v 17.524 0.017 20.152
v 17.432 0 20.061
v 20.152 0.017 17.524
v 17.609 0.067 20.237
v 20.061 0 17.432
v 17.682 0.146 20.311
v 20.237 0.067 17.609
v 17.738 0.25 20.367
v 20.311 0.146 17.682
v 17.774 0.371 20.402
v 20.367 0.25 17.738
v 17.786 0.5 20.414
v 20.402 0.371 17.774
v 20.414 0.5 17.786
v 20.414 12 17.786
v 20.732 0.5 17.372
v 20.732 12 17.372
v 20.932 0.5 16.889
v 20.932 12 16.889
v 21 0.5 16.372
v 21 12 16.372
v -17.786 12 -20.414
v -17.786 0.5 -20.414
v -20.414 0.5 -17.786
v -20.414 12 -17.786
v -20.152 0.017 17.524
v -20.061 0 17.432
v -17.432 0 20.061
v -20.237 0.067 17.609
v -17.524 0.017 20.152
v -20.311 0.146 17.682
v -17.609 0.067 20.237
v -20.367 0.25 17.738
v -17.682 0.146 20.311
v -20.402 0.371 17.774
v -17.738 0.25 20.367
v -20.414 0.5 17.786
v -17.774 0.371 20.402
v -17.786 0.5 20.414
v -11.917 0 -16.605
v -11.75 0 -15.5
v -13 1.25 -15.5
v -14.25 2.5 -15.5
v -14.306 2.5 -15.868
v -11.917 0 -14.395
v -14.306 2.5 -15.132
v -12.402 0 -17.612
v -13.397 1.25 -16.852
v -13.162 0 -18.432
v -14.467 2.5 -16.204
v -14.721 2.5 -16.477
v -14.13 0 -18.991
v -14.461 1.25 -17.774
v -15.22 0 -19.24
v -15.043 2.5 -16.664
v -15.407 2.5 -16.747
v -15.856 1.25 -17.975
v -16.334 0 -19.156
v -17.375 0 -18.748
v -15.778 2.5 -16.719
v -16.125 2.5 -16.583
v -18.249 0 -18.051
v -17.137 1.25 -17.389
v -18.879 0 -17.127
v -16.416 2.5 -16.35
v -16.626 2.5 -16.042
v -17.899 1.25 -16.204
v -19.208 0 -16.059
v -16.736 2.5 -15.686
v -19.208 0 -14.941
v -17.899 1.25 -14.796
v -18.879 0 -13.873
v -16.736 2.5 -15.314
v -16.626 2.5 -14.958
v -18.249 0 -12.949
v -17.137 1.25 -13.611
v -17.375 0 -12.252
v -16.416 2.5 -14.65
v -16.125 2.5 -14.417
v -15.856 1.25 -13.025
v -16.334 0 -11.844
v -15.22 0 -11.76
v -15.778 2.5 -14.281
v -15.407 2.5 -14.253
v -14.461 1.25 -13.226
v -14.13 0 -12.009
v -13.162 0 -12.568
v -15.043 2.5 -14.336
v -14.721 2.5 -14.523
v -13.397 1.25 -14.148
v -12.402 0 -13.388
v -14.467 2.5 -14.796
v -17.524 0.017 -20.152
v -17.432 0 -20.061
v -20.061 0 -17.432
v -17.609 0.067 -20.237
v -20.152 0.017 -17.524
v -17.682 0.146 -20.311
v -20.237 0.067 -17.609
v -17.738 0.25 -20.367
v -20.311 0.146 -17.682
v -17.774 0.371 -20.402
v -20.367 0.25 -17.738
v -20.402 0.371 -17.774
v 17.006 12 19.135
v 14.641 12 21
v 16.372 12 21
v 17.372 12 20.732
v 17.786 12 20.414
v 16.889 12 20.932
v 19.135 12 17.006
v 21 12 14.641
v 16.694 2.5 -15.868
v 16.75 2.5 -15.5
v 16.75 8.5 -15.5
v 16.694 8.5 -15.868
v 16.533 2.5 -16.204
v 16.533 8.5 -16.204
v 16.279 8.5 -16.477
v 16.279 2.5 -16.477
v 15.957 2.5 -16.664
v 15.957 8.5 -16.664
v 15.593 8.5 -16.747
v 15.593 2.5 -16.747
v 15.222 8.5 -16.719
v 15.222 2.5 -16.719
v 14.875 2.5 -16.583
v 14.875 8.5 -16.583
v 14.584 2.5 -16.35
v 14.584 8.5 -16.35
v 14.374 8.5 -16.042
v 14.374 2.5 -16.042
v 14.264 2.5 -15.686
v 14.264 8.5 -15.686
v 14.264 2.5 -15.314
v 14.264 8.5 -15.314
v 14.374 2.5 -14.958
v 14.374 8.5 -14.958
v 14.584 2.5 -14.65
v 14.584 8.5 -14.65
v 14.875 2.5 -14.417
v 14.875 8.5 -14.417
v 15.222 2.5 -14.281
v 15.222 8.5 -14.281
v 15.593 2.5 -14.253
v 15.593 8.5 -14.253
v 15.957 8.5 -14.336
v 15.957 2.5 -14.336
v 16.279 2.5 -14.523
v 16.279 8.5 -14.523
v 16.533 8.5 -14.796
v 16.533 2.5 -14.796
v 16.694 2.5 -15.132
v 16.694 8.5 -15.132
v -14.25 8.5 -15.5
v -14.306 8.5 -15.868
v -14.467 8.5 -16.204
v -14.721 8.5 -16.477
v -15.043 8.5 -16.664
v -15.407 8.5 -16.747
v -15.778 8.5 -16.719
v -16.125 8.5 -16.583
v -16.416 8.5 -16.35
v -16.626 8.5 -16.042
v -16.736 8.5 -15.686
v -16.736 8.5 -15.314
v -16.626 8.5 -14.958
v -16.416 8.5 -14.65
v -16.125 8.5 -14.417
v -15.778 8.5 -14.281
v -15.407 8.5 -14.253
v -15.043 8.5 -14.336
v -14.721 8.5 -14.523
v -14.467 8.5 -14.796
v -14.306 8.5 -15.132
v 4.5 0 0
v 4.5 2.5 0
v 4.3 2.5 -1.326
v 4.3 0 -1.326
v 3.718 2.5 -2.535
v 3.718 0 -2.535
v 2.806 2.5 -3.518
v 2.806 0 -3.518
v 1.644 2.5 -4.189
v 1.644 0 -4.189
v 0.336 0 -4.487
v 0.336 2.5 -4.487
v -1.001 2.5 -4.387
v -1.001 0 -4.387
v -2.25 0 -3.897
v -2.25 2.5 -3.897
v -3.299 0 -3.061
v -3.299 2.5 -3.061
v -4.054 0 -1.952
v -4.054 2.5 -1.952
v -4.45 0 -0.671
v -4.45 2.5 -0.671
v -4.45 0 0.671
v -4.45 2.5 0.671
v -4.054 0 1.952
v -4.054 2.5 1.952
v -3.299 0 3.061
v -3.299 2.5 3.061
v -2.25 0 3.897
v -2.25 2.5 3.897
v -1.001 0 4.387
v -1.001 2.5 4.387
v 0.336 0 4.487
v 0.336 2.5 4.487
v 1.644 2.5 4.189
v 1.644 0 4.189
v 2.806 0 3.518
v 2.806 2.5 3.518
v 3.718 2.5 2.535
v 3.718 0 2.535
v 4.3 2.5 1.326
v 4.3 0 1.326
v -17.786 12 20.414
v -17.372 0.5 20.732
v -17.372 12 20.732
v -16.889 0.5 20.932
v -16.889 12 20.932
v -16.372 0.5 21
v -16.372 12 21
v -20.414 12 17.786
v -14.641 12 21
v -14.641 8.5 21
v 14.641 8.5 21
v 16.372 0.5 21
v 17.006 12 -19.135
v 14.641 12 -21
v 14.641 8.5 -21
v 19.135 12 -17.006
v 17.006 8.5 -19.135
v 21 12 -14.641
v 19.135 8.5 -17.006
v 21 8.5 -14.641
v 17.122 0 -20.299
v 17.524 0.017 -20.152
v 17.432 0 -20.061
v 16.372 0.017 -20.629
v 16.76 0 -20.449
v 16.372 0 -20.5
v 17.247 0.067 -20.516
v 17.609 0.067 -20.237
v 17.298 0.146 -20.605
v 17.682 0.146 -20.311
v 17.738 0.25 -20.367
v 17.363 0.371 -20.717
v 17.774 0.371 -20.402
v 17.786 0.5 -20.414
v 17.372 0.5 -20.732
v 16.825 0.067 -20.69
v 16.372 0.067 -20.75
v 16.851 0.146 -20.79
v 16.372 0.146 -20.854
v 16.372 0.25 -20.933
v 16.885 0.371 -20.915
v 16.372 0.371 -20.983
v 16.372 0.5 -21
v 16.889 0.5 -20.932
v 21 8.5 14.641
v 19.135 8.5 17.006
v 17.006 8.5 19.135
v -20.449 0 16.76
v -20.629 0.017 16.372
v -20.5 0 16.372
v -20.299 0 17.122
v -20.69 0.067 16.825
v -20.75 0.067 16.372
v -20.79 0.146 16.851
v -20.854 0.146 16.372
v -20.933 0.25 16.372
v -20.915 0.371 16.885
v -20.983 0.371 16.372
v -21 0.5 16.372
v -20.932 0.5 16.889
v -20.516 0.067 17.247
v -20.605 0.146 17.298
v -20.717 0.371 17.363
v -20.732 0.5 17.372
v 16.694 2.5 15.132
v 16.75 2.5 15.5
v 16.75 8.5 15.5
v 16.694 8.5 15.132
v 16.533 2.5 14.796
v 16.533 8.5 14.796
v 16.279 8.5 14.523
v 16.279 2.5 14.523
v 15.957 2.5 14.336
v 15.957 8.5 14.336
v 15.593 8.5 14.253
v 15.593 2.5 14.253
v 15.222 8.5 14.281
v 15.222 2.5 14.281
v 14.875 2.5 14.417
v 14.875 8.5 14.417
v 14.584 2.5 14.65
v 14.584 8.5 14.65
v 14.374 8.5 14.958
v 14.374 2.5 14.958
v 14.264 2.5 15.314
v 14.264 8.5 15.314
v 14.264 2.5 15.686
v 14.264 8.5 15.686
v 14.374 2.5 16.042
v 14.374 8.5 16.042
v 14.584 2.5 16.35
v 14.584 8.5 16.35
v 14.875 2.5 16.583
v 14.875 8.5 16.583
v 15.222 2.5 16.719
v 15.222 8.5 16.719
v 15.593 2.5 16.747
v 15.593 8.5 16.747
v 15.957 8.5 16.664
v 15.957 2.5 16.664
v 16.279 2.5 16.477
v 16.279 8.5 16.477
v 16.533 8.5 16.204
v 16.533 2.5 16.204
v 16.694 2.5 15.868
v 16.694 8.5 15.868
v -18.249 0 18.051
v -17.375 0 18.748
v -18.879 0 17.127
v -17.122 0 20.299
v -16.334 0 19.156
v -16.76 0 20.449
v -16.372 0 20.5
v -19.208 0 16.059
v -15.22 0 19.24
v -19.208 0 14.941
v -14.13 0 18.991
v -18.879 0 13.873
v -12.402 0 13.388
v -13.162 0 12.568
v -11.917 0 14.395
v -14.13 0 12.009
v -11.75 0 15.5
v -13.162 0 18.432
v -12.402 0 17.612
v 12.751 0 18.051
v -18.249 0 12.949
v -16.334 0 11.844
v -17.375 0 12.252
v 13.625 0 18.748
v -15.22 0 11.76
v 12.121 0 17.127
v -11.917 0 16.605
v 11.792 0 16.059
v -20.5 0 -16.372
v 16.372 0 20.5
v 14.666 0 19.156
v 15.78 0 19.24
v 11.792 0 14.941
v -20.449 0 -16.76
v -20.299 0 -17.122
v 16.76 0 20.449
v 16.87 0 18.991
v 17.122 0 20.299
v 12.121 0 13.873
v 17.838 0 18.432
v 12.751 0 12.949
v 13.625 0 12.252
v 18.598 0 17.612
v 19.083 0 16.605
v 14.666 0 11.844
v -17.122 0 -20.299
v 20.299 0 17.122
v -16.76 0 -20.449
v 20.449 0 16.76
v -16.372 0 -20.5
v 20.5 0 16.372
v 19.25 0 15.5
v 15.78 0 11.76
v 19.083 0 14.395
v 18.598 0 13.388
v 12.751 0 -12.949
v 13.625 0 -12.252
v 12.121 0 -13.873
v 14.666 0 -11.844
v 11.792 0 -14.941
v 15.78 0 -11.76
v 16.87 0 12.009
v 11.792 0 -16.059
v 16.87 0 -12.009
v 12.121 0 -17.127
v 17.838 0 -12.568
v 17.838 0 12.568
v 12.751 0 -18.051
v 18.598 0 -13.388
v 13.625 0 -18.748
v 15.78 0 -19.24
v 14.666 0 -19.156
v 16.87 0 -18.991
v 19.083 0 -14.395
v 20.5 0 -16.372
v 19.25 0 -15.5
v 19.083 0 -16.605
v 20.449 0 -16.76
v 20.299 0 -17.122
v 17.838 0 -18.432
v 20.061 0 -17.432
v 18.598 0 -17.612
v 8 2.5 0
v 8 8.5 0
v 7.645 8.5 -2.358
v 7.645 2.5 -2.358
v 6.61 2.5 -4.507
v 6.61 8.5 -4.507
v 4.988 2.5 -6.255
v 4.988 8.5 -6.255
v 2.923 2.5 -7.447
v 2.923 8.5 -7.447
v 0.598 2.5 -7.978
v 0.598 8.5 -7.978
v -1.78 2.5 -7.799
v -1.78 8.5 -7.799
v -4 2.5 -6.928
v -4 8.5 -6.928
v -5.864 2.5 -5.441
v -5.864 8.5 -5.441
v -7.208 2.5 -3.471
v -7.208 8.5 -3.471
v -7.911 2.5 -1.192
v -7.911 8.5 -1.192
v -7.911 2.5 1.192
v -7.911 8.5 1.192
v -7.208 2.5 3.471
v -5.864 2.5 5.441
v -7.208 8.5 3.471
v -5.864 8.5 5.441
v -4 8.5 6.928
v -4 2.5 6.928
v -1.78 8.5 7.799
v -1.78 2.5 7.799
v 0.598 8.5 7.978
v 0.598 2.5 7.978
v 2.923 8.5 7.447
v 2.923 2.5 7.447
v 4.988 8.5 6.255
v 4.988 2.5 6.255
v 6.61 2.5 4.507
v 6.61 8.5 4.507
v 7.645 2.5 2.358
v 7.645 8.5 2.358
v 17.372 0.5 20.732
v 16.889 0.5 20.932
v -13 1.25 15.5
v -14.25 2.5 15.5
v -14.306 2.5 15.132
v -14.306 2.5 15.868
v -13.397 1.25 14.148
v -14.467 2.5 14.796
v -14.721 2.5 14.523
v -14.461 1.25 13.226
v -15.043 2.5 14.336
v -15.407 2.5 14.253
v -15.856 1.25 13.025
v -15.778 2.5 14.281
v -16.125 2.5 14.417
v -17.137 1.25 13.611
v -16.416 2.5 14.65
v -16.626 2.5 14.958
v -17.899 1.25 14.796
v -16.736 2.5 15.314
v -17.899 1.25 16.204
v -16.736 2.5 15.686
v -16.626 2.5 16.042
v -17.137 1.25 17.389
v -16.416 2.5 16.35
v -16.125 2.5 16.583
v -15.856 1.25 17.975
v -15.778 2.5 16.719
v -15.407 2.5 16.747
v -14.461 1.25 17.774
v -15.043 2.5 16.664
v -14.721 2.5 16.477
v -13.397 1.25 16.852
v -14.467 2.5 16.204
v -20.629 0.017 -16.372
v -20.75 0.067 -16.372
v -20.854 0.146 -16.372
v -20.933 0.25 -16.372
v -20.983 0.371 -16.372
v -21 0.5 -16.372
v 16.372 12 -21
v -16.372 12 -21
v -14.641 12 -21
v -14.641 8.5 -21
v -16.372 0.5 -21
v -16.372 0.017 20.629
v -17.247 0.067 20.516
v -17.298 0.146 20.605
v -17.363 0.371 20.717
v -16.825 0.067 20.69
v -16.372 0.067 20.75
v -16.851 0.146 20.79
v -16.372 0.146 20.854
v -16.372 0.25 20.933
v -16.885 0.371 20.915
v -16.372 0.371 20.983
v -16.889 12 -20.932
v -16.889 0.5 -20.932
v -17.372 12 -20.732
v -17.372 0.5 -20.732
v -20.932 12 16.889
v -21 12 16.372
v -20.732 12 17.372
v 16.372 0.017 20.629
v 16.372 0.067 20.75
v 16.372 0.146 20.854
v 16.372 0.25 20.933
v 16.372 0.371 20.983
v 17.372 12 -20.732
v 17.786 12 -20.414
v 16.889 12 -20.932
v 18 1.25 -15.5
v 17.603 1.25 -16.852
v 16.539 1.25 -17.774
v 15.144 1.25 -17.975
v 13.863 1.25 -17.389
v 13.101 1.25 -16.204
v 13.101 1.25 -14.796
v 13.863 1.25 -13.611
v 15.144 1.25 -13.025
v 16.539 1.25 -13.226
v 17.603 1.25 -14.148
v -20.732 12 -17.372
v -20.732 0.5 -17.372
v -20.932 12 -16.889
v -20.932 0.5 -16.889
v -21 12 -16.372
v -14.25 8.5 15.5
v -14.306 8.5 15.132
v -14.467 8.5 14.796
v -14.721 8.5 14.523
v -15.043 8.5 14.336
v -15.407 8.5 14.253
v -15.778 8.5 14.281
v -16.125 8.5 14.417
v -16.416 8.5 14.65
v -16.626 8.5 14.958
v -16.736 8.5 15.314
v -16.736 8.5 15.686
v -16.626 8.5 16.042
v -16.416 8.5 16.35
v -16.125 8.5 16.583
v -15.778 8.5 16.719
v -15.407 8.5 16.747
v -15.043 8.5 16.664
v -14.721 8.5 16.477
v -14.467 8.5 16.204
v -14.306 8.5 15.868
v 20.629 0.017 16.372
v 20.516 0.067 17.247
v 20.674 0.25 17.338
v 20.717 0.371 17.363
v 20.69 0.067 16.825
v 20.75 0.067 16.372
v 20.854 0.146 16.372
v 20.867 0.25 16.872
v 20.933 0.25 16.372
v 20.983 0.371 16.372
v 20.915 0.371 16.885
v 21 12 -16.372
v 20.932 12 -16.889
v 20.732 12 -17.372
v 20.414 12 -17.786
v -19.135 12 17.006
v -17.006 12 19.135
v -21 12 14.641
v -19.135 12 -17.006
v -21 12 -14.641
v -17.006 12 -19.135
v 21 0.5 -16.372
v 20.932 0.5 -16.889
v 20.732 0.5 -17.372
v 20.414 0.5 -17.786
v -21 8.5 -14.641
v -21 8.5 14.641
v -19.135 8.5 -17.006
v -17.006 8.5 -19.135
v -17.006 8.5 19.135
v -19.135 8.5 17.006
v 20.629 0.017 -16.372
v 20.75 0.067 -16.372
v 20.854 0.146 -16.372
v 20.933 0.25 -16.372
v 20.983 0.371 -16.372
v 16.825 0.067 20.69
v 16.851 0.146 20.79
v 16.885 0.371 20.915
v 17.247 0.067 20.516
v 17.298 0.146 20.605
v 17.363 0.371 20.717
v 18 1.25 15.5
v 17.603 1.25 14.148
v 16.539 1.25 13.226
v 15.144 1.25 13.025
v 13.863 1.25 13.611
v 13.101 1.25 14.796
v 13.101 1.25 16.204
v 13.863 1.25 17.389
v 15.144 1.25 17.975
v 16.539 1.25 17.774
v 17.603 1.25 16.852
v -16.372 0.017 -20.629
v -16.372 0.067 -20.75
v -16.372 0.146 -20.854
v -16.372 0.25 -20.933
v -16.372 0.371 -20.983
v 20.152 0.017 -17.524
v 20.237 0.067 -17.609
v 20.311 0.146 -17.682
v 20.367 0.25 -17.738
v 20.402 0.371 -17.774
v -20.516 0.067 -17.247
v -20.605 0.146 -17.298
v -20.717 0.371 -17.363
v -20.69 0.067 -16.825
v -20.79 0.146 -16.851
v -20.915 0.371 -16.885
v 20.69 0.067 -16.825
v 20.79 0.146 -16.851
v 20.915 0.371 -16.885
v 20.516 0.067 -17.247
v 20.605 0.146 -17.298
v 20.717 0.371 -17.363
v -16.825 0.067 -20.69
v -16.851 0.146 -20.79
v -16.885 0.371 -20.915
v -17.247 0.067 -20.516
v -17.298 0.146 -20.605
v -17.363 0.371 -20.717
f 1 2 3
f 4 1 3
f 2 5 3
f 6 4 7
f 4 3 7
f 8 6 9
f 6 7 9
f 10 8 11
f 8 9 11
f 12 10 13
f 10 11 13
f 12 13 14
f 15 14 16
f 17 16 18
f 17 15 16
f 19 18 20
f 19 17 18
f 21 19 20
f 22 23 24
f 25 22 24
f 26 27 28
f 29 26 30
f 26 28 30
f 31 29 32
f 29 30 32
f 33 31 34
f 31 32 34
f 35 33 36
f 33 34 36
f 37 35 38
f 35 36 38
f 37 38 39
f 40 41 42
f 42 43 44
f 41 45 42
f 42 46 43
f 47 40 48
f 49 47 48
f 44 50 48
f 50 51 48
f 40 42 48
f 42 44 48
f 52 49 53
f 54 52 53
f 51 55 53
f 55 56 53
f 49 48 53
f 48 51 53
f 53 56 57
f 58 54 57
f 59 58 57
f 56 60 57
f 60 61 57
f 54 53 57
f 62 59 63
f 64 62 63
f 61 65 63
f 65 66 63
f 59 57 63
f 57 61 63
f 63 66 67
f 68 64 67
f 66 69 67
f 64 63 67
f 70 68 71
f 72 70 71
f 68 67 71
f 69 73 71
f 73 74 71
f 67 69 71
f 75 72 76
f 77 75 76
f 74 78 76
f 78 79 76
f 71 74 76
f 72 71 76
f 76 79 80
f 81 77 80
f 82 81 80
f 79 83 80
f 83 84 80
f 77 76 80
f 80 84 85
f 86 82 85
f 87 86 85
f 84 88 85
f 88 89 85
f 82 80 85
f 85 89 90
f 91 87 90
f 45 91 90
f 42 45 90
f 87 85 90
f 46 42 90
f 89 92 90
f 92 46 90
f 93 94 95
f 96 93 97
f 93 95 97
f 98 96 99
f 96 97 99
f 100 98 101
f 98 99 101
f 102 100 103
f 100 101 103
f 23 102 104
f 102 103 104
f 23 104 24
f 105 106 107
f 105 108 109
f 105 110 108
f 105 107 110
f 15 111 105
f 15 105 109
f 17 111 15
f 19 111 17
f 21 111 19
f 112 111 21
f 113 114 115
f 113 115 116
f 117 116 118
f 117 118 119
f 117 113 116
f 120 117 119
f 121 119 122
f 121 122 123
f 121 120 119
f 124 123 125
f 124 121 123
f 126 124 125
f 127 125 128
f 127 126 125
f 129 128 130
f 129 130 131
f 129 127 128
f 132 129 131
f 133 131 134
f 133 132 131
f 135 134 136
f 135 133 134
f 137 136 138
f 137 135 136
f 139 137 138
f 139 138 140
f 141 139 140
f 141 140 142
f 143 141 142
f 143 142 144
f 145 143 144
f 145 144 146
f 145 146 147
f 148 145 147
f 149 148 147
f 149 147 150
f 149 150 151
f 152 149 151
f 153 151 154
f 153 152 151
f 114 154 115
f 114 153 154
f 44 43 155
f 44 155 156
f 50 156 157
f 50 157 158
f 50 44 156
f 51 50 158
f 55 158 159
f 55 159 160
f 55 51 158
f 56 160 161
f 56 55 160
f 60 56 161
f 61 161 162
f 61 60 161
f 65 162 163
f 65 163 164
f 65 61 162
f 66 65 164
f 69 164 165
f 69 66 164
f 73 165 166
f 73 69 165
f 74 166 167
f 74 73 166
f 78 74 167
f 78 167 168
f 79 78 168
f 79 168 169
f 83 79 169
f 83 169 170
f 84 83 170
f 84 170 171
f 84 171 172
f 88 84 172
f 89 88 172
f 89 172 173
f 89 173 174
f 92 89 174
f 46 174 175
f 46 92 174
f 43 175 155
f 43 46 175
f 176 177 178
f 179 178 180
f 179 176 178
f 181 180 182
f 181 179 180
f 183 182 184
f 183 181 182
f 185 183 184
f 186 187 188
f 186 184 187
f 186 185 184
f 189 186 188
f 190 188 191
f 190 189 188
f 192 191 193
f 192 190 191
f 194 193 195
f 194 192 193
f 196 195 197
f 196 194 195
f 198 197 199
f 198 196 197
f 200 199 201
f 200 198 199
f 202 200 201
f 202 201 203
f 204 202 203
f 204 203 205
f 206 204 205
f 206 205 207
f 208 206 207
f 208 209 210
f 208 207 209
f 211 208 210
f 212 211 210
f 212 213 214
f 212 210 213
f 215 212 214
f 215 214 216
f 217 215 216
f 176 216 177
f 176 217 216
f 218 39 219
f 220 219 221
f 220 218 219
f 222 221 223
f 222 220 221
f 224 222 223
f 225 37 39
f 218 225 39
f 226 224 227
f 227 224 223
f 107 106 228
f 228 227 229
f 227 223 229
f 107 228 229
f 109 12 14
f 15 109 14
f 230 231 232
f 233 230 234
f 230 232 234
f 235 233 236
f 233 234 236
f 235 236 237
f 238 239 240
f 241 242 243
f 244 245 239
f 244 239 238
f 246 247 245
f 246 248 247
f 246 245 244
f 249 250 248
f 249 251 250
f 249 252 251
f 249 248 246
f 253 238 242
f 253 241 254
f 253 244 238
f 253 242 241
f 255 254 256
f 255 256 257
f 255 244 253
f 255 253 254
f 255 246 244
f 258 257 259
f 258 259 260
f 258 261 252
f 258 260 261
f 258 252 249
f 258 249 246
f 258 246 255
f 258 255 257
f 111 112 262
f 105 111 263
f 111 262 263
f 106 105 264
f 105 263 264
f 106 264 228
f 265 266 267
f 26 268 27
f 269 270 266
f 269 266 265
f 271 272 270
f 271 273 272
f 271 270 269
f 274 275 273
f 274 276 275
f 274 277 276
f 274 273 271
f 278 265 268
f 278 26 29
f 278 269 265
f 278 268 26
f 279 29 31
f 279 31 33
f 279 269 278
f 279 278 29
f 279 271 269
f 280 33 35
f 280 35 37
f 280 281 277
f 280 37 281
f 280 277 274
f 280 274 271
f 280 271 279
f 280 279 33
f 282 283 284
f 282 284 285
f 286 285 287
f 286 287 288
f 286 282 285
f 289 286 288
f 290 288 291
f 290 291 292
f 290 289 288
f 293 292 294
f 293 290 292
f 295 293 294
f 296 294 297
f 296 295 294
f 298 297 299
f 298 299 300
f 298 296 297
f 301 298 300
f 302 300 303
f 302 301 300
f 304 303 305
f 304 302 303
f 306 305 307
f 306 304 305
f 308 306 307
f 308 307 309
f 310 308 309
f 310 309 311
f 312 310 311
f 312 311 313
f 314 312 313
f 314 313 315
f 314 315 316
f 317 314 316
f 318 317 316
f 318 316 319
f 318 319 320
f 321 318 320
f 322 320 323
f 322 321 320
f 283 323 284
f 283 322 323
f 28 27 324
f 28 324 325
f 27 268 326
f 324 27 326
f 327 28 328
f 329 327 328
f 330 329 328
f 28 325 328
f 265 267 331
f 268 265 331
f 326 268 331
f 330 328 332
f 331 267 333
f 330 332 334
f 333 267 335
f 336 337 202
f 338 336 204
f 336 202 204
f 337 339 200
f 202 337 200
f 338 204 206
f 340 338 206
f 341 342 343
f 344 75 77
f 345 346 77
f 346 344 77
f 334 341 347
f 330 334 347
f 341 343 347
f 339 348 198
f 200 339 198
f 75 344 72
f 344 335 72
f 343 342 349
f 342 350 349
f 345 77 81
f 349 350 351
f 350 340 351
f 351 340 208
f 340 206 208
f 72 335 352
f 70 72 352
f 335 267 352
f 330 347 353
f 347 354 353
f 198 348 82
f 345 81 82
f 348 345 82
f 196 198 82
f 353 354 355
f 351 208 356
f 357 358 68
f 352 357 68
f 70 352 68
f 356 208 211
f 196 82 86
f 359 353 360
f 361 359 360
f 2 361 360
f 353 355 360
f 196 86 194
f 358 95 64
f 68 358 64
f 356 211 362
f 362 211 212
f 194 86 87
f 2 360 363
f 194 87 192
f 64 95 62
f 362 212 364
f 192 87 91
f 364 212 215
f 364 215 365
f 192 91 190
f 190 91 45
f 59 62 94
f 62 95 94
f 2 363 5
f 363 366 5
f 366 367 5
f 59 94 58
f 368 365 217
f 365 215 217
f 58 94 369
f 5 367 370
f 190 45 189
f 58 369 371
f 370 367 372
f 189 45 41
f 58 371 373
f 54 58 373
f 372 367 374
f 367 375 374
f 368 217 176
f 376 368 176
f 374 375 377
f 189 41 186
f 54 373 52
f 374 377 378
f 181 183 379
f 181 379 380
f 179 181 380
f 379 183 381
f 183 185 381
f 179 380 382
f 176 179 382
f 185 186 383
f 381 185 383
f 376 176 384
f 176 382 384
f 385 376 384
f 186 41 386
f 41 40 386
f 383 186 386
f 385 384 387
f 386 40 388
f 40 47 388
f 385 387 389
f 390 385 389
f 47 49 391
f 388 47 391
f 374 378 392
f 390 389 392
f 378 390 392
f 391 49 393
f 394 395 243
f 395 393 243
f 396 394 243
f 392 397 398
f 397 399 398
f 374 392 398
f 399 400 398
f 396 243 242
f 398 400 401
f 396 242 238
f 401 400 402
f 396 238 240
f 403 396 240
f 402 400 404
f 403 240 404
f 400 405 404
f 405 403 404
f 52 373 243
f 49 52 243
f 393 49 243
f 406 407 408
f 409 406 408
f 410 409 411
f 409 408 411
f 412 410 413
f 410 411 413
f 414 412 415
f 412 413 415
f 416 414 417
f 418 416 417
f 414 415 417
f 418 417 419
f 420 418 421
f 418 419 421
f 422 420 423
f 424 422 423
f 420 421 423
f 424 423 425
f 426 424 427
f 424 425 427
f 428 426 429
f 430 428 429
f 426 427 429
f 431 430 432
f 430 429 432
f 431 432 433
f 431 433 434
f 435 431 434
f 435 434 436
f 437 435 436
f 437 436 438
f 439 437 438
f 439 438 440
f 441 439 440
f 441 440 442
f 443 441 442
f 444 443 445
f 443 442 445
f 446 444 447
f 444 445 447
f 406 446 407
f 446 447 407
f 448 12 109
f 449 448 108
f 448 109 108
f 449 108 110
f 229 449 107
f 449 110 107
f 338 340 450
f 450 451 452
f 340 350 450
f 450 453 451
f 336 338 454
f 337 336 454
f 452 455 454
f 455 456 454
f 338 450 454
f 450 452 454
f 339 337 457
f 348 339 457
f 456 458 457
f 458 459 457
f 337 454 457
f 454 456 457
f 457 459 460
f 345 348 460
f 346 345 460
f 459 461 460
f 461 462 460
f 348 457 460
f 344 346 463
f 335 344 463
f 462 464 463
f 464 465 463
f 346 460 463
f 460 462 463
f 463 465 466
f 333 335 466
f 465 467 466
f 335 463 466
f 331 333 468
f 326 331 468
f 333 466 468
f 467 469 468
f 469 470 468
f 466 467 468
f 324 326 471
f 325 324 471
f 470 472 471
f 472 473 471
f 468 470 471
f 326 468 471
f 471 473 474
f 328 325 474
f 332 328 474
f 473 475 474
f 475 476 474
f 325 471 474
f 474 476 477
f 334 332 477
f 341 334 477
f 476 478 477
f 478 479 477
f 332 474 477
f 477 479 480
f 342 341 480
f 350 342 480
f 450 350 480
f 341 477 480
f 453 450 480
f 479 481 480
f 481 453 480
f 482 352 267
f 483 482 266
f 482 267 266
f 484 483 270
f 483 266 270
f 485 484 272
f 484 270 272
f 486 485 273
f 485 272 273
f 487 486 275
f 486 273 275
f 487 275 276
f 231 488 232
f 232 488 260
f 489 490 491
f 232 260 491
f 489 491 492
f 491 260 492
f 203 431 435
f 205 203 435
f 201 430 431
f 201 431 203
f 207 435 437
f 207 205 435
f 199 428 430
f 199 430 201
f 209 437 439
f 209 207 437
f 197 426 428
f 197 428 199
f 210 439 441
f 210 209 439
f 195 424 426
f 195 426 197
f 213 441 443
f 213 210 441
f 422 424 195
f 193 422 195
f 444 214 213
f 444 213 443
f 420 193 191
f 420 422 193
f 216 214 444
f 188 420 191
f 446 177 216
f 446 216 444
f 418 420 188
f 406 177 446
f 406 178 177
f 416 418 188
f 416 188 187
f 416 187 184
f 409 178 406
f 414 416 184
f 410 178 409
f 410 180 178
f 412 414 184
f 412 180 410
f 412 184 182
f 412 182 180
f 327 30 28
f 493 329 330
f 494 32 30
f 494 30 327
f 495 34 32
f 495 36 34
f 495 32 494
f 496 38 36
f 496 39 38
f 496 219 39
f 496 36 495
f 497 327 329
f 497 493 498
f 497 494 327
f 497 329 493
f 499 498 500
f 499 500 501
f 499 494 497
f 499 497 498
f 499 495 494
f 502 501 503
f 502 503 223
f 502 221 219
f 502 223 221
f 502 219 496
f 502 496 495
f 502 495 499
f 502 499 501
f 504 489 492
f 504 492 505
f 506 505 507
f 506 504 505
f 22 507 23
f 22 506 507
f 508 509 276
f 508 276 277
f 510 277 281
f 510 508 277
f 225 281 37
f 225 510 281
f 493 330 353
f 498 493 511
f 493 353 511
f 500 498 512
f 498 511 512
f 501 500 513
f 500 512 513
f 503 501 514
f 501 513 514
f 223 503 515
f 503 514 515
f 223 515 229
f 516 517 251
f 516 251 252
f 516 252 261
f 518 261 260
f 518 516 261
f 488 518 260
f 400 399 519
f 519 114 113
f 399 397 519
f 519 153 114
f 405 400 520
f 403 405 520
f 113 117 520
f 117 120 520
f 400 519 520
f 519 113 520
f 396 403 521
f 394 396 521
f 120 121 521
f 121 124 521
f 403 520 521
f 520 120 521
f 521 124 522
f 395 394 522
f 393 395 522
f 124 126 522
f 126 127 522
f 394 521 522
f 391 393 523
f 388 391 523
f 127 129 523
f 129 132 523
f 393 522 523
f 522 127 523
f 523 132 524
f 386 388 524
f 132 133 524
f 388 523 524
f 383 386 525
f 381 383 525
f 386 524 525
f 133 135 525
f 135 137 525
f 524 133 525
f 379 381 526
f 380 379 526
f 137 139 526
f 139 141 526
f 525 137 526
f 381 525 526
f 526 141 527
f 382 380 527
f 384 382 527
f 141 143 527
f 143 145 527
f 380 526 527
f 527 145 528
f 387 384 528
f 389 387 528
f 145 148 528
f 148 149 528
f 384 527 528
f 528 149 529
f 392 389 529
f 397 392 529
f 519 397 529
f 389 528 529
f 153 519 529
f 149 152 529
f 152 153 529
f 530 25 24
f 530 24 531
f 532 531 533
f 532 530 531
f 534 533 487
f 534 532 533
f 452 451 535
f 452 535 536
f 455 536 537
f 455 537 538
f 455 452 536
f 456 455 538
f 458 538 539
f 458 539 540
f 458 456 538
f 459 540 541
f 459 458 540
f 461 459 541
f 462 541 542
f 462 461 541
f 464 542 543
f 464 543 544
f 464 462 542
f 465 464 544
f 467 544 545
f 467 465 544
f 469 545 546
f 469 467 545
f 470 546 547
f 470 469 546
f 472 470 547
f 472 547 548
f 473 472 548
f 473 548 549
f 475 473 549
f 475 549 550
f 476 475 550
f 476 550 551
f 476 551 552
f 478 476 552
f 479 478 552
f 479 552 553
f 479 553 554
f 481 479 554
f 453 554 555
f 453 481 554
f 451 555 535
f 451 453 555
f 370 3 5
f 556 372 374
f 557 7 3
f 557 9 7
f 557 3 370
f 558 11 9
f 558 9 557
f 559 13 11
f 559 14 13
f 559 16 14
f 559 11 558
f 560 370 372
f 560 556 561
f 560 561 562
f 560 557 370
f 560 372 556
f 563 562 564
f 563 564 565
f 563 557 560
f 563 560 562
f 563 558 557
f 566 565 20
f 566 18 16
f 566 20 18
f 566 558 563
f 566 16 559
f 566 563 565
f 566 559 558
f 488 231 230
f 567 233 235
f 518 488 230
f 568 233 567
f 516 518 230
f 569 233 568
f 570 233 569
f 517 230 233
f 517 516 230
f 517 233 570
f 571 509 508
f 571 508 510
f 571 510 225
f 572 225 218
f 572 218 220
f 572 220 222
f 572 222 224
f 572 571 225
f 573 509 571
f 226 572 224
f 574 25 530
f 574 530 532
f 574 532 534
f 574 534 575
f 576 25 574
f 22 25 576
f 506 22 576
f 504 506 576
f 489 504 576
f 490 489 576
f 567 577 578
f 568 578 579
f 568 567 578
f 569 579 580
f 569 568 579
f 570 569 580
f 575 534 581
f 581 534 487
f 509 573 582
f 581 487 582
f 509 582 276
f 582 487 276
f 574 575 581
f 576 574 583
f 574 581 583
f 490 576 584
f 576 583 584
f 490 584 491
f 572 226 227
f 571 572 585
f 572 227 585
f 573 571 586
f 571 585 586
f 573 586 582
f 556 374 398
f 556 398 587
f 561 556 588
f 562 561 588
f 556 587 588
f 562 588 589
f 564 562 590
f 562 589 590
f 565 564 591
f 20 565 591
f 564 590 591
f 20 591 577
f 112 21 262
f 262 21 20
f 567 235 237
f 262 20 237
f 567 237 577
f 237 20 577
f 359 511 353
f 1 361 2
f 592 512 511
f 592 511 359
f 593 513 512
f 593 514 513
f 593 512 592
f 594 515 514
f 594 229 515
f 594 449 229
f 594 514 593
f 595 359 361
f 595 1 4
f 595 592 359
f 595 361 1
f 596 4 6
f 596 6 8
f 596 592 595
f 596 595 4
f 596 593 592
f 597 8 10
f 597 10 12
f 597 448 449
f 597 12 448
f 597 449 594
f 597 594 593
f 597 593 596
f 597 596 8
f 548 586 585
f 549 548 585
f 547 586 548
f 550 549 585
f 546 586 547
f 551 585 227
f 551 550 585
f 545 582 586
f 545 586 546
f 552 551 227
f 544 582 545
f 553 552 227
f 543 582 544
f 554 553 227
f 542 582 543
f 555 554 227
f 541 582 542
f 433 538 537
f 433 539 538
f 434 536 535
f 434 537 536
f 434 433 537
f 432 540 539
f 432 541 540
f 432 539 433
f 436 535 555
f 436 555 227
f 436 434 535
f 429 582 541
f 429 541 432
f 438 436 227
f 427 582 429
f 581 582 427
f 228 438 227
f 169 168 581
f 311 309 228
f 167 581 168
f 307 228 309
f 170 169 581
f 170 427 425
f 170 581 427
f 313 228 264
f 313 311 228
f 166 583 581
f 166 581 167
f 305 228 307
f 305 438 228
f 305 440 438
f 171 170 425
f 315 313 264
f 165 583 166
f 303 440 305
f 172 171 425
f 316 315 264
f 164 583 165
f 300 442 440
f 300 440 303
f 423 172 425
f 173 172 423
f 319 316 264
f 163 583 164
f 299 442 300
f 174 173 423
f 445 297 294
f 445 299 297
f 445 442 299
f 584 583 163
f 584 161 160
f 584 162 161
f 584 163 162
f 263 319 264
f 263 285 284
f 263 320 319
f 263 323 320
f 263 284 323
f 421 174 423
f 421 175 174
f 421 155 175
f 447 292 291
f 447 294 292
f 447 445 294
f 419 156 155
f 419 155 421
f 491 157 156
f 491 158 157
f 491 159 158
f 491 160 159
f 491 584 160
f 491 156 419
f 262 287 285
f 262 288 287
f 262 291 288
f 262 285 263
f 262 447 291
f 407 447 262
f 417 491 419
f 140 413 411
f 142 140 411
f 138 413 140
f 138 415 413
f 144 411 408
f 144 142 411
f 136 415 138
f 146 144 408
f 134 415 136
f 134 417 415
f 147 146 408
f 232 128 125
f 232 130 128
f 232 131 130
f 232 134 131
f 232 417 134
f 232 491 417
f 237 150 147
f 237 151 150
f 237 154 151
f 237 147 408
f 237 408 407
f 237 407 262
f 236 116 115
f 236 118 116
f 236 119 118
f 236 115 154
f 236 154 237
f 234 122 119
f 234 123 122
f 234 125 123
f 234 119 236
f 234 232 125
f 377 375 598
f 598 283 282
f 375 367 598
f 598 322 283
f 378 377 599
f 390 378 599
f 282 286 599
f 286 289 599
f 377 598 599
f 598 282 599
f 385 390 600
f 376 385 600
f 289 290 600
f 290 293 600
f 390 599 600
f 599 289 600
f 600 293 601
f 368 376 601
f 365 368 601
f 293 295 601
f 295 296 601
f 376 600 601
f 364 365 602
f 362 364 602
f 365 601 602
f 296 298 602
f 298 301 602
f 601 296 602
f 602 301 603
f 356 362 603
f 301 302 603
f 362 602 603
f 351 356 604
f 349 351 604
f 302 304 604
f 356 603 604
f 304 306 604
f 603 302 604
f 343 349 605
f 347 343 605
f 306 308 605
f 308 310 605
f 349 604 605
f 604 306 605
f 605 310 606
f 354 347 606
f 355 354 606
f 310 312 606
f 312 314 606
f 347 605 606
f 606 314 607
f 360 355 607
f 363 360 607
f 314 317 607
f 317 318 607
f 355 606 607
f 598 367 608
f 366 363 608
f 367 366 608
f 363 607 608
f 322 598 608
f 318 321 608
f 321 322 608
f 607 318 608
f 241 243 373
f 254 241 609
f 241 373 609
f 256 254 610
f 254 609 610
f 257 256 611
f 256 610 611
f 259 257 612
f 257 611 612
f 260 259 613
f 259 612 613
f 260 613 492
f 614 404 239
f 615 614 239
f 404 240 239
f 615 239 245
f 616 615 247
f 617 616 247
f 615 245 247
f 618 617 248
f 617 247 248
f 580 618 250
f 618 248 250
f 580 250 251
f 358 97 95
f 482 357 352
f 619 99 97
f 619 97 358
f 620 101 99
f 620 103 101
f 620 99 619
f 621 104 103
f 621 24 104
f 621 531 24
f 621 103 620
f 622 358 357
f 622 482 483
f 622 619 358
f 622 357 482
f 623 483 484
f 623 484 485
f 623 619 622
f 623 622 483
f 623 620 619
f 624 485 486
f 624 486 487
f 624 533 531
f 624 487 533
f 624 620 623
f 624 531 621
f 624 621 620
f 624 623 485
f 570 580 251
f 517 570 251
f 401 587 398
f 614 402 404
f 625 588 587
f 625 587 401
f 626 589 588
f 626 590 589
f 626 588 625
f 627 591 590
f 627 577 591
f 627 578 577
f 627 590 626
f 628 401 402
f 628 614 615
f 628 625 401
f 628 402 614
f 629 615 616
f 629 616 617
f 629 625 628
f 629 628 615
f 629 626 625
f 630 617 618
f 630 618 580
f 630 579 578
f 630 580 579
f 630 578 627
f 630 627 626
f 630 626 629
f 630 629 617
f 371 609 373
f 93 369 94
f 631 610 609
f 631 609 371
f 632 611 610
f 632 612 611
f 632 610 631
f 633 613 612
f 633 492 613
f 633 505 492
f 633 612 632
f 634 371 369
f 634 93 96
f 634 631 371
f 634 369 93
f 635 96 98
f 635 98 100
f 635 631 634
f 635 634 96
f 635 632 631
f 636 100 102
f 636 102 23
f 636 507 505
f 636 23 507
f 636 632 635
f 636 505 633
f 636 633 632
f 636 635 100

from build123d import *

# Parameters (mm, degrees)
SKETCH_1_R          = 1.25
SKETCH_1_R_2        = 4.5
EXTRUDE_1_DEPTH     = 8.5
EXTRUDE_2_DEPTH     = 12
CHAMFER_1_SIZE      = 2.5
SKETCH_2_R          = 8
CUT_EXTRUDE_1_DEPTH = 6
FILLET_1_R          = 2
FILLET_2_R          = 0.5


with BuildPart() as part:
    # Эскиз1 → Бобышка-Вытянуть1 (new body)
    with BuildSketch(Plane(origin=(0, 0, 0), x_dir=(1, 0, 0), z_dir=(0, 1, 0))):
        with BuildLine():
            ThreePointArc((-14.641038215, 21), (-18.101933598, 18.101933598), (-21, 14.641038215))
            Line((-21, 14.641038215), (-21, -14.641038215))
            ThreePointArc((-21, -14.641038215), (-18.101933598, -18.101933598), (-14.641038215, -21))
            Line((-14.641038215, -21), (14.641038215, -21))
            ThreePointArc((14.641038215, -21), (18.101933598, -18.101933598), (21, -14.641038215))
            Line((21, -14.641038215), (21, 14.641038215))
            ThreePointArc((21, 14.641038215), (18.101933598, 18.101933598), (14.641038215, 21))
            Line((14.641038215, 21), (-14.641038215, 21))
        make_face()
        with Locations((-15.5, -15.5)):
            Circle(SKETCH_1_R, mode=Mode.SUBTRACT)
        with Locations((15.5, -15.5)):
            Circle(SKETCH_1_R, mode=Mode.SUBTRACT)
        with Locations((-15.5, 15.5)):
            Circle(SKETCH_1_R, mode=Mode.SUBTRACT)
        with Locations((15.5, 15.5)):
            Circle(SKETCH_1_R, mode=Mode.SUBTRACT)
        Circle(SKETCH_1_R_2, mode=Mode.SUBTRACT)
    extrude(amount=EXTRUDE_1_DEPTH)

    # Эскиз1<4> → Бобышка-Вытянуть2 (add)
    with BuildSketch(Plane(origin=(0, 0, 0), x_dir=(1, 0, 0), z_dir=(0, 1, 0))):
        with BuildLine():
            Line((-17.2, 21), (-21, 17.2))
            Line((-21, 17.2), (-21, 14.641038215))
            ThreePointArc((-21, 14.641038215), (-18.101933598, 18.101933598), (-14.641038215, 21))
            Line((-14.641038215, 21), (-17.2, 21))
        make_face()
        with BuildLine():
            ThreePointArc((-14.641038215, -21), (-18.101933598, -18.101933598), (-21, -14.641038215))
            Line((-21, -14.641038215), (-21, -17.2))
            Line((-21, -17.2), (-17.2, -21))
            Line((-17.2, -21), (-14.641038215, -21))
        make_face()
        with BuildLine():
            Line((17.2, 21), (14.641038215, 21))
            ThreePointArc((14.641038215, 21), (18.101933598, 18.101933598), (21, 14.641038215))
            Line((21, 14.641038215), (21, 17.2))
            Line((21, 17.2), (17.2, 21))
        make_face()
        with BuildLine():
            ThreePointArc((21, -14.641038215), (18.101933598, -18.101933598), (14.641038215, -21))
            Line((14.641038215, -21), (17.2, -21))
            Line((17.2, -21), (21, -17.2))
            Line((21, -17.2), (21, -14.641038215))
        make_face()
    extrude(amount=EXTRUDE_2_DEPTH)

    # Фаска1
    chamfer_1_edges = [part.edges().sort_by_distance(p)[0] for p in [
        (-16.75, 0, -15.5),
        (14.25, 0, -15.5),
        (14.25, 0, 15.5),
        (-16.75, 0, 15.5),
    ]]
    chamfer(chamfer_1_edges, length=CHAMFER_1_SIZE)

    # Эскиз2 → Вырез-Вытянуть1 (cut)
    with BuildSketch(Plane(origin=(0, 8.5, 0), x_dir=(1, 0, 0), z_dir=(0, 1, 0))):
        Circle(SKETCH_2_R)
    extrude(amount=-CUT_EXTRUDE_1_DEPTH, mode=Mode.SUBTRACT)

    # Скругление1
    fillet_1_edges = [part.edges().sort_by_distance(p)[0] for p in [
        (21, 6, 17.2),
        (17.2, 6, 21),
        (-17.2, 6, 21),
        (-21, 6, 17.2),
        (-21, 6, -17.2),
        (-17.2, 6, -21),
        (17.2, 6, -21),
        (21, 6, -17.2),
    ]]
    fillet(fillet_1_edges, radius=FILLET_1_R)

    # Скругление2
    fillet_2_edges = [part.edges().sort_by_distance(p)[0] for p in [
        (-17.13693974, 0, 20.847759065),
        (-19.1, 0, 19.1),
        (-20.847759065, 0, 17.13693974),
        (-21, 0, 0),
        (-20.847759065, 0, -17.13693974),
        (-19.1, 0, -19.1),
        (-17.13693974, 0, -20.847759065),
        (0, 0, -21),
        (17.13693974, 0, -20.847759065),
        (19.1, 0, -19.1),
        (20.847759065, 0, -17.13693974),
        (21, 0, 0),
        (20.847759065, 0, 17.13693974),
        (19.1, 0, 19.1),
        (17.13693974, 0, 20.847759065),
        (0, 0, 21),
    ]]
    fillet(fillet_2_edges, radius=FILLET_2_R)


solid = part.part
